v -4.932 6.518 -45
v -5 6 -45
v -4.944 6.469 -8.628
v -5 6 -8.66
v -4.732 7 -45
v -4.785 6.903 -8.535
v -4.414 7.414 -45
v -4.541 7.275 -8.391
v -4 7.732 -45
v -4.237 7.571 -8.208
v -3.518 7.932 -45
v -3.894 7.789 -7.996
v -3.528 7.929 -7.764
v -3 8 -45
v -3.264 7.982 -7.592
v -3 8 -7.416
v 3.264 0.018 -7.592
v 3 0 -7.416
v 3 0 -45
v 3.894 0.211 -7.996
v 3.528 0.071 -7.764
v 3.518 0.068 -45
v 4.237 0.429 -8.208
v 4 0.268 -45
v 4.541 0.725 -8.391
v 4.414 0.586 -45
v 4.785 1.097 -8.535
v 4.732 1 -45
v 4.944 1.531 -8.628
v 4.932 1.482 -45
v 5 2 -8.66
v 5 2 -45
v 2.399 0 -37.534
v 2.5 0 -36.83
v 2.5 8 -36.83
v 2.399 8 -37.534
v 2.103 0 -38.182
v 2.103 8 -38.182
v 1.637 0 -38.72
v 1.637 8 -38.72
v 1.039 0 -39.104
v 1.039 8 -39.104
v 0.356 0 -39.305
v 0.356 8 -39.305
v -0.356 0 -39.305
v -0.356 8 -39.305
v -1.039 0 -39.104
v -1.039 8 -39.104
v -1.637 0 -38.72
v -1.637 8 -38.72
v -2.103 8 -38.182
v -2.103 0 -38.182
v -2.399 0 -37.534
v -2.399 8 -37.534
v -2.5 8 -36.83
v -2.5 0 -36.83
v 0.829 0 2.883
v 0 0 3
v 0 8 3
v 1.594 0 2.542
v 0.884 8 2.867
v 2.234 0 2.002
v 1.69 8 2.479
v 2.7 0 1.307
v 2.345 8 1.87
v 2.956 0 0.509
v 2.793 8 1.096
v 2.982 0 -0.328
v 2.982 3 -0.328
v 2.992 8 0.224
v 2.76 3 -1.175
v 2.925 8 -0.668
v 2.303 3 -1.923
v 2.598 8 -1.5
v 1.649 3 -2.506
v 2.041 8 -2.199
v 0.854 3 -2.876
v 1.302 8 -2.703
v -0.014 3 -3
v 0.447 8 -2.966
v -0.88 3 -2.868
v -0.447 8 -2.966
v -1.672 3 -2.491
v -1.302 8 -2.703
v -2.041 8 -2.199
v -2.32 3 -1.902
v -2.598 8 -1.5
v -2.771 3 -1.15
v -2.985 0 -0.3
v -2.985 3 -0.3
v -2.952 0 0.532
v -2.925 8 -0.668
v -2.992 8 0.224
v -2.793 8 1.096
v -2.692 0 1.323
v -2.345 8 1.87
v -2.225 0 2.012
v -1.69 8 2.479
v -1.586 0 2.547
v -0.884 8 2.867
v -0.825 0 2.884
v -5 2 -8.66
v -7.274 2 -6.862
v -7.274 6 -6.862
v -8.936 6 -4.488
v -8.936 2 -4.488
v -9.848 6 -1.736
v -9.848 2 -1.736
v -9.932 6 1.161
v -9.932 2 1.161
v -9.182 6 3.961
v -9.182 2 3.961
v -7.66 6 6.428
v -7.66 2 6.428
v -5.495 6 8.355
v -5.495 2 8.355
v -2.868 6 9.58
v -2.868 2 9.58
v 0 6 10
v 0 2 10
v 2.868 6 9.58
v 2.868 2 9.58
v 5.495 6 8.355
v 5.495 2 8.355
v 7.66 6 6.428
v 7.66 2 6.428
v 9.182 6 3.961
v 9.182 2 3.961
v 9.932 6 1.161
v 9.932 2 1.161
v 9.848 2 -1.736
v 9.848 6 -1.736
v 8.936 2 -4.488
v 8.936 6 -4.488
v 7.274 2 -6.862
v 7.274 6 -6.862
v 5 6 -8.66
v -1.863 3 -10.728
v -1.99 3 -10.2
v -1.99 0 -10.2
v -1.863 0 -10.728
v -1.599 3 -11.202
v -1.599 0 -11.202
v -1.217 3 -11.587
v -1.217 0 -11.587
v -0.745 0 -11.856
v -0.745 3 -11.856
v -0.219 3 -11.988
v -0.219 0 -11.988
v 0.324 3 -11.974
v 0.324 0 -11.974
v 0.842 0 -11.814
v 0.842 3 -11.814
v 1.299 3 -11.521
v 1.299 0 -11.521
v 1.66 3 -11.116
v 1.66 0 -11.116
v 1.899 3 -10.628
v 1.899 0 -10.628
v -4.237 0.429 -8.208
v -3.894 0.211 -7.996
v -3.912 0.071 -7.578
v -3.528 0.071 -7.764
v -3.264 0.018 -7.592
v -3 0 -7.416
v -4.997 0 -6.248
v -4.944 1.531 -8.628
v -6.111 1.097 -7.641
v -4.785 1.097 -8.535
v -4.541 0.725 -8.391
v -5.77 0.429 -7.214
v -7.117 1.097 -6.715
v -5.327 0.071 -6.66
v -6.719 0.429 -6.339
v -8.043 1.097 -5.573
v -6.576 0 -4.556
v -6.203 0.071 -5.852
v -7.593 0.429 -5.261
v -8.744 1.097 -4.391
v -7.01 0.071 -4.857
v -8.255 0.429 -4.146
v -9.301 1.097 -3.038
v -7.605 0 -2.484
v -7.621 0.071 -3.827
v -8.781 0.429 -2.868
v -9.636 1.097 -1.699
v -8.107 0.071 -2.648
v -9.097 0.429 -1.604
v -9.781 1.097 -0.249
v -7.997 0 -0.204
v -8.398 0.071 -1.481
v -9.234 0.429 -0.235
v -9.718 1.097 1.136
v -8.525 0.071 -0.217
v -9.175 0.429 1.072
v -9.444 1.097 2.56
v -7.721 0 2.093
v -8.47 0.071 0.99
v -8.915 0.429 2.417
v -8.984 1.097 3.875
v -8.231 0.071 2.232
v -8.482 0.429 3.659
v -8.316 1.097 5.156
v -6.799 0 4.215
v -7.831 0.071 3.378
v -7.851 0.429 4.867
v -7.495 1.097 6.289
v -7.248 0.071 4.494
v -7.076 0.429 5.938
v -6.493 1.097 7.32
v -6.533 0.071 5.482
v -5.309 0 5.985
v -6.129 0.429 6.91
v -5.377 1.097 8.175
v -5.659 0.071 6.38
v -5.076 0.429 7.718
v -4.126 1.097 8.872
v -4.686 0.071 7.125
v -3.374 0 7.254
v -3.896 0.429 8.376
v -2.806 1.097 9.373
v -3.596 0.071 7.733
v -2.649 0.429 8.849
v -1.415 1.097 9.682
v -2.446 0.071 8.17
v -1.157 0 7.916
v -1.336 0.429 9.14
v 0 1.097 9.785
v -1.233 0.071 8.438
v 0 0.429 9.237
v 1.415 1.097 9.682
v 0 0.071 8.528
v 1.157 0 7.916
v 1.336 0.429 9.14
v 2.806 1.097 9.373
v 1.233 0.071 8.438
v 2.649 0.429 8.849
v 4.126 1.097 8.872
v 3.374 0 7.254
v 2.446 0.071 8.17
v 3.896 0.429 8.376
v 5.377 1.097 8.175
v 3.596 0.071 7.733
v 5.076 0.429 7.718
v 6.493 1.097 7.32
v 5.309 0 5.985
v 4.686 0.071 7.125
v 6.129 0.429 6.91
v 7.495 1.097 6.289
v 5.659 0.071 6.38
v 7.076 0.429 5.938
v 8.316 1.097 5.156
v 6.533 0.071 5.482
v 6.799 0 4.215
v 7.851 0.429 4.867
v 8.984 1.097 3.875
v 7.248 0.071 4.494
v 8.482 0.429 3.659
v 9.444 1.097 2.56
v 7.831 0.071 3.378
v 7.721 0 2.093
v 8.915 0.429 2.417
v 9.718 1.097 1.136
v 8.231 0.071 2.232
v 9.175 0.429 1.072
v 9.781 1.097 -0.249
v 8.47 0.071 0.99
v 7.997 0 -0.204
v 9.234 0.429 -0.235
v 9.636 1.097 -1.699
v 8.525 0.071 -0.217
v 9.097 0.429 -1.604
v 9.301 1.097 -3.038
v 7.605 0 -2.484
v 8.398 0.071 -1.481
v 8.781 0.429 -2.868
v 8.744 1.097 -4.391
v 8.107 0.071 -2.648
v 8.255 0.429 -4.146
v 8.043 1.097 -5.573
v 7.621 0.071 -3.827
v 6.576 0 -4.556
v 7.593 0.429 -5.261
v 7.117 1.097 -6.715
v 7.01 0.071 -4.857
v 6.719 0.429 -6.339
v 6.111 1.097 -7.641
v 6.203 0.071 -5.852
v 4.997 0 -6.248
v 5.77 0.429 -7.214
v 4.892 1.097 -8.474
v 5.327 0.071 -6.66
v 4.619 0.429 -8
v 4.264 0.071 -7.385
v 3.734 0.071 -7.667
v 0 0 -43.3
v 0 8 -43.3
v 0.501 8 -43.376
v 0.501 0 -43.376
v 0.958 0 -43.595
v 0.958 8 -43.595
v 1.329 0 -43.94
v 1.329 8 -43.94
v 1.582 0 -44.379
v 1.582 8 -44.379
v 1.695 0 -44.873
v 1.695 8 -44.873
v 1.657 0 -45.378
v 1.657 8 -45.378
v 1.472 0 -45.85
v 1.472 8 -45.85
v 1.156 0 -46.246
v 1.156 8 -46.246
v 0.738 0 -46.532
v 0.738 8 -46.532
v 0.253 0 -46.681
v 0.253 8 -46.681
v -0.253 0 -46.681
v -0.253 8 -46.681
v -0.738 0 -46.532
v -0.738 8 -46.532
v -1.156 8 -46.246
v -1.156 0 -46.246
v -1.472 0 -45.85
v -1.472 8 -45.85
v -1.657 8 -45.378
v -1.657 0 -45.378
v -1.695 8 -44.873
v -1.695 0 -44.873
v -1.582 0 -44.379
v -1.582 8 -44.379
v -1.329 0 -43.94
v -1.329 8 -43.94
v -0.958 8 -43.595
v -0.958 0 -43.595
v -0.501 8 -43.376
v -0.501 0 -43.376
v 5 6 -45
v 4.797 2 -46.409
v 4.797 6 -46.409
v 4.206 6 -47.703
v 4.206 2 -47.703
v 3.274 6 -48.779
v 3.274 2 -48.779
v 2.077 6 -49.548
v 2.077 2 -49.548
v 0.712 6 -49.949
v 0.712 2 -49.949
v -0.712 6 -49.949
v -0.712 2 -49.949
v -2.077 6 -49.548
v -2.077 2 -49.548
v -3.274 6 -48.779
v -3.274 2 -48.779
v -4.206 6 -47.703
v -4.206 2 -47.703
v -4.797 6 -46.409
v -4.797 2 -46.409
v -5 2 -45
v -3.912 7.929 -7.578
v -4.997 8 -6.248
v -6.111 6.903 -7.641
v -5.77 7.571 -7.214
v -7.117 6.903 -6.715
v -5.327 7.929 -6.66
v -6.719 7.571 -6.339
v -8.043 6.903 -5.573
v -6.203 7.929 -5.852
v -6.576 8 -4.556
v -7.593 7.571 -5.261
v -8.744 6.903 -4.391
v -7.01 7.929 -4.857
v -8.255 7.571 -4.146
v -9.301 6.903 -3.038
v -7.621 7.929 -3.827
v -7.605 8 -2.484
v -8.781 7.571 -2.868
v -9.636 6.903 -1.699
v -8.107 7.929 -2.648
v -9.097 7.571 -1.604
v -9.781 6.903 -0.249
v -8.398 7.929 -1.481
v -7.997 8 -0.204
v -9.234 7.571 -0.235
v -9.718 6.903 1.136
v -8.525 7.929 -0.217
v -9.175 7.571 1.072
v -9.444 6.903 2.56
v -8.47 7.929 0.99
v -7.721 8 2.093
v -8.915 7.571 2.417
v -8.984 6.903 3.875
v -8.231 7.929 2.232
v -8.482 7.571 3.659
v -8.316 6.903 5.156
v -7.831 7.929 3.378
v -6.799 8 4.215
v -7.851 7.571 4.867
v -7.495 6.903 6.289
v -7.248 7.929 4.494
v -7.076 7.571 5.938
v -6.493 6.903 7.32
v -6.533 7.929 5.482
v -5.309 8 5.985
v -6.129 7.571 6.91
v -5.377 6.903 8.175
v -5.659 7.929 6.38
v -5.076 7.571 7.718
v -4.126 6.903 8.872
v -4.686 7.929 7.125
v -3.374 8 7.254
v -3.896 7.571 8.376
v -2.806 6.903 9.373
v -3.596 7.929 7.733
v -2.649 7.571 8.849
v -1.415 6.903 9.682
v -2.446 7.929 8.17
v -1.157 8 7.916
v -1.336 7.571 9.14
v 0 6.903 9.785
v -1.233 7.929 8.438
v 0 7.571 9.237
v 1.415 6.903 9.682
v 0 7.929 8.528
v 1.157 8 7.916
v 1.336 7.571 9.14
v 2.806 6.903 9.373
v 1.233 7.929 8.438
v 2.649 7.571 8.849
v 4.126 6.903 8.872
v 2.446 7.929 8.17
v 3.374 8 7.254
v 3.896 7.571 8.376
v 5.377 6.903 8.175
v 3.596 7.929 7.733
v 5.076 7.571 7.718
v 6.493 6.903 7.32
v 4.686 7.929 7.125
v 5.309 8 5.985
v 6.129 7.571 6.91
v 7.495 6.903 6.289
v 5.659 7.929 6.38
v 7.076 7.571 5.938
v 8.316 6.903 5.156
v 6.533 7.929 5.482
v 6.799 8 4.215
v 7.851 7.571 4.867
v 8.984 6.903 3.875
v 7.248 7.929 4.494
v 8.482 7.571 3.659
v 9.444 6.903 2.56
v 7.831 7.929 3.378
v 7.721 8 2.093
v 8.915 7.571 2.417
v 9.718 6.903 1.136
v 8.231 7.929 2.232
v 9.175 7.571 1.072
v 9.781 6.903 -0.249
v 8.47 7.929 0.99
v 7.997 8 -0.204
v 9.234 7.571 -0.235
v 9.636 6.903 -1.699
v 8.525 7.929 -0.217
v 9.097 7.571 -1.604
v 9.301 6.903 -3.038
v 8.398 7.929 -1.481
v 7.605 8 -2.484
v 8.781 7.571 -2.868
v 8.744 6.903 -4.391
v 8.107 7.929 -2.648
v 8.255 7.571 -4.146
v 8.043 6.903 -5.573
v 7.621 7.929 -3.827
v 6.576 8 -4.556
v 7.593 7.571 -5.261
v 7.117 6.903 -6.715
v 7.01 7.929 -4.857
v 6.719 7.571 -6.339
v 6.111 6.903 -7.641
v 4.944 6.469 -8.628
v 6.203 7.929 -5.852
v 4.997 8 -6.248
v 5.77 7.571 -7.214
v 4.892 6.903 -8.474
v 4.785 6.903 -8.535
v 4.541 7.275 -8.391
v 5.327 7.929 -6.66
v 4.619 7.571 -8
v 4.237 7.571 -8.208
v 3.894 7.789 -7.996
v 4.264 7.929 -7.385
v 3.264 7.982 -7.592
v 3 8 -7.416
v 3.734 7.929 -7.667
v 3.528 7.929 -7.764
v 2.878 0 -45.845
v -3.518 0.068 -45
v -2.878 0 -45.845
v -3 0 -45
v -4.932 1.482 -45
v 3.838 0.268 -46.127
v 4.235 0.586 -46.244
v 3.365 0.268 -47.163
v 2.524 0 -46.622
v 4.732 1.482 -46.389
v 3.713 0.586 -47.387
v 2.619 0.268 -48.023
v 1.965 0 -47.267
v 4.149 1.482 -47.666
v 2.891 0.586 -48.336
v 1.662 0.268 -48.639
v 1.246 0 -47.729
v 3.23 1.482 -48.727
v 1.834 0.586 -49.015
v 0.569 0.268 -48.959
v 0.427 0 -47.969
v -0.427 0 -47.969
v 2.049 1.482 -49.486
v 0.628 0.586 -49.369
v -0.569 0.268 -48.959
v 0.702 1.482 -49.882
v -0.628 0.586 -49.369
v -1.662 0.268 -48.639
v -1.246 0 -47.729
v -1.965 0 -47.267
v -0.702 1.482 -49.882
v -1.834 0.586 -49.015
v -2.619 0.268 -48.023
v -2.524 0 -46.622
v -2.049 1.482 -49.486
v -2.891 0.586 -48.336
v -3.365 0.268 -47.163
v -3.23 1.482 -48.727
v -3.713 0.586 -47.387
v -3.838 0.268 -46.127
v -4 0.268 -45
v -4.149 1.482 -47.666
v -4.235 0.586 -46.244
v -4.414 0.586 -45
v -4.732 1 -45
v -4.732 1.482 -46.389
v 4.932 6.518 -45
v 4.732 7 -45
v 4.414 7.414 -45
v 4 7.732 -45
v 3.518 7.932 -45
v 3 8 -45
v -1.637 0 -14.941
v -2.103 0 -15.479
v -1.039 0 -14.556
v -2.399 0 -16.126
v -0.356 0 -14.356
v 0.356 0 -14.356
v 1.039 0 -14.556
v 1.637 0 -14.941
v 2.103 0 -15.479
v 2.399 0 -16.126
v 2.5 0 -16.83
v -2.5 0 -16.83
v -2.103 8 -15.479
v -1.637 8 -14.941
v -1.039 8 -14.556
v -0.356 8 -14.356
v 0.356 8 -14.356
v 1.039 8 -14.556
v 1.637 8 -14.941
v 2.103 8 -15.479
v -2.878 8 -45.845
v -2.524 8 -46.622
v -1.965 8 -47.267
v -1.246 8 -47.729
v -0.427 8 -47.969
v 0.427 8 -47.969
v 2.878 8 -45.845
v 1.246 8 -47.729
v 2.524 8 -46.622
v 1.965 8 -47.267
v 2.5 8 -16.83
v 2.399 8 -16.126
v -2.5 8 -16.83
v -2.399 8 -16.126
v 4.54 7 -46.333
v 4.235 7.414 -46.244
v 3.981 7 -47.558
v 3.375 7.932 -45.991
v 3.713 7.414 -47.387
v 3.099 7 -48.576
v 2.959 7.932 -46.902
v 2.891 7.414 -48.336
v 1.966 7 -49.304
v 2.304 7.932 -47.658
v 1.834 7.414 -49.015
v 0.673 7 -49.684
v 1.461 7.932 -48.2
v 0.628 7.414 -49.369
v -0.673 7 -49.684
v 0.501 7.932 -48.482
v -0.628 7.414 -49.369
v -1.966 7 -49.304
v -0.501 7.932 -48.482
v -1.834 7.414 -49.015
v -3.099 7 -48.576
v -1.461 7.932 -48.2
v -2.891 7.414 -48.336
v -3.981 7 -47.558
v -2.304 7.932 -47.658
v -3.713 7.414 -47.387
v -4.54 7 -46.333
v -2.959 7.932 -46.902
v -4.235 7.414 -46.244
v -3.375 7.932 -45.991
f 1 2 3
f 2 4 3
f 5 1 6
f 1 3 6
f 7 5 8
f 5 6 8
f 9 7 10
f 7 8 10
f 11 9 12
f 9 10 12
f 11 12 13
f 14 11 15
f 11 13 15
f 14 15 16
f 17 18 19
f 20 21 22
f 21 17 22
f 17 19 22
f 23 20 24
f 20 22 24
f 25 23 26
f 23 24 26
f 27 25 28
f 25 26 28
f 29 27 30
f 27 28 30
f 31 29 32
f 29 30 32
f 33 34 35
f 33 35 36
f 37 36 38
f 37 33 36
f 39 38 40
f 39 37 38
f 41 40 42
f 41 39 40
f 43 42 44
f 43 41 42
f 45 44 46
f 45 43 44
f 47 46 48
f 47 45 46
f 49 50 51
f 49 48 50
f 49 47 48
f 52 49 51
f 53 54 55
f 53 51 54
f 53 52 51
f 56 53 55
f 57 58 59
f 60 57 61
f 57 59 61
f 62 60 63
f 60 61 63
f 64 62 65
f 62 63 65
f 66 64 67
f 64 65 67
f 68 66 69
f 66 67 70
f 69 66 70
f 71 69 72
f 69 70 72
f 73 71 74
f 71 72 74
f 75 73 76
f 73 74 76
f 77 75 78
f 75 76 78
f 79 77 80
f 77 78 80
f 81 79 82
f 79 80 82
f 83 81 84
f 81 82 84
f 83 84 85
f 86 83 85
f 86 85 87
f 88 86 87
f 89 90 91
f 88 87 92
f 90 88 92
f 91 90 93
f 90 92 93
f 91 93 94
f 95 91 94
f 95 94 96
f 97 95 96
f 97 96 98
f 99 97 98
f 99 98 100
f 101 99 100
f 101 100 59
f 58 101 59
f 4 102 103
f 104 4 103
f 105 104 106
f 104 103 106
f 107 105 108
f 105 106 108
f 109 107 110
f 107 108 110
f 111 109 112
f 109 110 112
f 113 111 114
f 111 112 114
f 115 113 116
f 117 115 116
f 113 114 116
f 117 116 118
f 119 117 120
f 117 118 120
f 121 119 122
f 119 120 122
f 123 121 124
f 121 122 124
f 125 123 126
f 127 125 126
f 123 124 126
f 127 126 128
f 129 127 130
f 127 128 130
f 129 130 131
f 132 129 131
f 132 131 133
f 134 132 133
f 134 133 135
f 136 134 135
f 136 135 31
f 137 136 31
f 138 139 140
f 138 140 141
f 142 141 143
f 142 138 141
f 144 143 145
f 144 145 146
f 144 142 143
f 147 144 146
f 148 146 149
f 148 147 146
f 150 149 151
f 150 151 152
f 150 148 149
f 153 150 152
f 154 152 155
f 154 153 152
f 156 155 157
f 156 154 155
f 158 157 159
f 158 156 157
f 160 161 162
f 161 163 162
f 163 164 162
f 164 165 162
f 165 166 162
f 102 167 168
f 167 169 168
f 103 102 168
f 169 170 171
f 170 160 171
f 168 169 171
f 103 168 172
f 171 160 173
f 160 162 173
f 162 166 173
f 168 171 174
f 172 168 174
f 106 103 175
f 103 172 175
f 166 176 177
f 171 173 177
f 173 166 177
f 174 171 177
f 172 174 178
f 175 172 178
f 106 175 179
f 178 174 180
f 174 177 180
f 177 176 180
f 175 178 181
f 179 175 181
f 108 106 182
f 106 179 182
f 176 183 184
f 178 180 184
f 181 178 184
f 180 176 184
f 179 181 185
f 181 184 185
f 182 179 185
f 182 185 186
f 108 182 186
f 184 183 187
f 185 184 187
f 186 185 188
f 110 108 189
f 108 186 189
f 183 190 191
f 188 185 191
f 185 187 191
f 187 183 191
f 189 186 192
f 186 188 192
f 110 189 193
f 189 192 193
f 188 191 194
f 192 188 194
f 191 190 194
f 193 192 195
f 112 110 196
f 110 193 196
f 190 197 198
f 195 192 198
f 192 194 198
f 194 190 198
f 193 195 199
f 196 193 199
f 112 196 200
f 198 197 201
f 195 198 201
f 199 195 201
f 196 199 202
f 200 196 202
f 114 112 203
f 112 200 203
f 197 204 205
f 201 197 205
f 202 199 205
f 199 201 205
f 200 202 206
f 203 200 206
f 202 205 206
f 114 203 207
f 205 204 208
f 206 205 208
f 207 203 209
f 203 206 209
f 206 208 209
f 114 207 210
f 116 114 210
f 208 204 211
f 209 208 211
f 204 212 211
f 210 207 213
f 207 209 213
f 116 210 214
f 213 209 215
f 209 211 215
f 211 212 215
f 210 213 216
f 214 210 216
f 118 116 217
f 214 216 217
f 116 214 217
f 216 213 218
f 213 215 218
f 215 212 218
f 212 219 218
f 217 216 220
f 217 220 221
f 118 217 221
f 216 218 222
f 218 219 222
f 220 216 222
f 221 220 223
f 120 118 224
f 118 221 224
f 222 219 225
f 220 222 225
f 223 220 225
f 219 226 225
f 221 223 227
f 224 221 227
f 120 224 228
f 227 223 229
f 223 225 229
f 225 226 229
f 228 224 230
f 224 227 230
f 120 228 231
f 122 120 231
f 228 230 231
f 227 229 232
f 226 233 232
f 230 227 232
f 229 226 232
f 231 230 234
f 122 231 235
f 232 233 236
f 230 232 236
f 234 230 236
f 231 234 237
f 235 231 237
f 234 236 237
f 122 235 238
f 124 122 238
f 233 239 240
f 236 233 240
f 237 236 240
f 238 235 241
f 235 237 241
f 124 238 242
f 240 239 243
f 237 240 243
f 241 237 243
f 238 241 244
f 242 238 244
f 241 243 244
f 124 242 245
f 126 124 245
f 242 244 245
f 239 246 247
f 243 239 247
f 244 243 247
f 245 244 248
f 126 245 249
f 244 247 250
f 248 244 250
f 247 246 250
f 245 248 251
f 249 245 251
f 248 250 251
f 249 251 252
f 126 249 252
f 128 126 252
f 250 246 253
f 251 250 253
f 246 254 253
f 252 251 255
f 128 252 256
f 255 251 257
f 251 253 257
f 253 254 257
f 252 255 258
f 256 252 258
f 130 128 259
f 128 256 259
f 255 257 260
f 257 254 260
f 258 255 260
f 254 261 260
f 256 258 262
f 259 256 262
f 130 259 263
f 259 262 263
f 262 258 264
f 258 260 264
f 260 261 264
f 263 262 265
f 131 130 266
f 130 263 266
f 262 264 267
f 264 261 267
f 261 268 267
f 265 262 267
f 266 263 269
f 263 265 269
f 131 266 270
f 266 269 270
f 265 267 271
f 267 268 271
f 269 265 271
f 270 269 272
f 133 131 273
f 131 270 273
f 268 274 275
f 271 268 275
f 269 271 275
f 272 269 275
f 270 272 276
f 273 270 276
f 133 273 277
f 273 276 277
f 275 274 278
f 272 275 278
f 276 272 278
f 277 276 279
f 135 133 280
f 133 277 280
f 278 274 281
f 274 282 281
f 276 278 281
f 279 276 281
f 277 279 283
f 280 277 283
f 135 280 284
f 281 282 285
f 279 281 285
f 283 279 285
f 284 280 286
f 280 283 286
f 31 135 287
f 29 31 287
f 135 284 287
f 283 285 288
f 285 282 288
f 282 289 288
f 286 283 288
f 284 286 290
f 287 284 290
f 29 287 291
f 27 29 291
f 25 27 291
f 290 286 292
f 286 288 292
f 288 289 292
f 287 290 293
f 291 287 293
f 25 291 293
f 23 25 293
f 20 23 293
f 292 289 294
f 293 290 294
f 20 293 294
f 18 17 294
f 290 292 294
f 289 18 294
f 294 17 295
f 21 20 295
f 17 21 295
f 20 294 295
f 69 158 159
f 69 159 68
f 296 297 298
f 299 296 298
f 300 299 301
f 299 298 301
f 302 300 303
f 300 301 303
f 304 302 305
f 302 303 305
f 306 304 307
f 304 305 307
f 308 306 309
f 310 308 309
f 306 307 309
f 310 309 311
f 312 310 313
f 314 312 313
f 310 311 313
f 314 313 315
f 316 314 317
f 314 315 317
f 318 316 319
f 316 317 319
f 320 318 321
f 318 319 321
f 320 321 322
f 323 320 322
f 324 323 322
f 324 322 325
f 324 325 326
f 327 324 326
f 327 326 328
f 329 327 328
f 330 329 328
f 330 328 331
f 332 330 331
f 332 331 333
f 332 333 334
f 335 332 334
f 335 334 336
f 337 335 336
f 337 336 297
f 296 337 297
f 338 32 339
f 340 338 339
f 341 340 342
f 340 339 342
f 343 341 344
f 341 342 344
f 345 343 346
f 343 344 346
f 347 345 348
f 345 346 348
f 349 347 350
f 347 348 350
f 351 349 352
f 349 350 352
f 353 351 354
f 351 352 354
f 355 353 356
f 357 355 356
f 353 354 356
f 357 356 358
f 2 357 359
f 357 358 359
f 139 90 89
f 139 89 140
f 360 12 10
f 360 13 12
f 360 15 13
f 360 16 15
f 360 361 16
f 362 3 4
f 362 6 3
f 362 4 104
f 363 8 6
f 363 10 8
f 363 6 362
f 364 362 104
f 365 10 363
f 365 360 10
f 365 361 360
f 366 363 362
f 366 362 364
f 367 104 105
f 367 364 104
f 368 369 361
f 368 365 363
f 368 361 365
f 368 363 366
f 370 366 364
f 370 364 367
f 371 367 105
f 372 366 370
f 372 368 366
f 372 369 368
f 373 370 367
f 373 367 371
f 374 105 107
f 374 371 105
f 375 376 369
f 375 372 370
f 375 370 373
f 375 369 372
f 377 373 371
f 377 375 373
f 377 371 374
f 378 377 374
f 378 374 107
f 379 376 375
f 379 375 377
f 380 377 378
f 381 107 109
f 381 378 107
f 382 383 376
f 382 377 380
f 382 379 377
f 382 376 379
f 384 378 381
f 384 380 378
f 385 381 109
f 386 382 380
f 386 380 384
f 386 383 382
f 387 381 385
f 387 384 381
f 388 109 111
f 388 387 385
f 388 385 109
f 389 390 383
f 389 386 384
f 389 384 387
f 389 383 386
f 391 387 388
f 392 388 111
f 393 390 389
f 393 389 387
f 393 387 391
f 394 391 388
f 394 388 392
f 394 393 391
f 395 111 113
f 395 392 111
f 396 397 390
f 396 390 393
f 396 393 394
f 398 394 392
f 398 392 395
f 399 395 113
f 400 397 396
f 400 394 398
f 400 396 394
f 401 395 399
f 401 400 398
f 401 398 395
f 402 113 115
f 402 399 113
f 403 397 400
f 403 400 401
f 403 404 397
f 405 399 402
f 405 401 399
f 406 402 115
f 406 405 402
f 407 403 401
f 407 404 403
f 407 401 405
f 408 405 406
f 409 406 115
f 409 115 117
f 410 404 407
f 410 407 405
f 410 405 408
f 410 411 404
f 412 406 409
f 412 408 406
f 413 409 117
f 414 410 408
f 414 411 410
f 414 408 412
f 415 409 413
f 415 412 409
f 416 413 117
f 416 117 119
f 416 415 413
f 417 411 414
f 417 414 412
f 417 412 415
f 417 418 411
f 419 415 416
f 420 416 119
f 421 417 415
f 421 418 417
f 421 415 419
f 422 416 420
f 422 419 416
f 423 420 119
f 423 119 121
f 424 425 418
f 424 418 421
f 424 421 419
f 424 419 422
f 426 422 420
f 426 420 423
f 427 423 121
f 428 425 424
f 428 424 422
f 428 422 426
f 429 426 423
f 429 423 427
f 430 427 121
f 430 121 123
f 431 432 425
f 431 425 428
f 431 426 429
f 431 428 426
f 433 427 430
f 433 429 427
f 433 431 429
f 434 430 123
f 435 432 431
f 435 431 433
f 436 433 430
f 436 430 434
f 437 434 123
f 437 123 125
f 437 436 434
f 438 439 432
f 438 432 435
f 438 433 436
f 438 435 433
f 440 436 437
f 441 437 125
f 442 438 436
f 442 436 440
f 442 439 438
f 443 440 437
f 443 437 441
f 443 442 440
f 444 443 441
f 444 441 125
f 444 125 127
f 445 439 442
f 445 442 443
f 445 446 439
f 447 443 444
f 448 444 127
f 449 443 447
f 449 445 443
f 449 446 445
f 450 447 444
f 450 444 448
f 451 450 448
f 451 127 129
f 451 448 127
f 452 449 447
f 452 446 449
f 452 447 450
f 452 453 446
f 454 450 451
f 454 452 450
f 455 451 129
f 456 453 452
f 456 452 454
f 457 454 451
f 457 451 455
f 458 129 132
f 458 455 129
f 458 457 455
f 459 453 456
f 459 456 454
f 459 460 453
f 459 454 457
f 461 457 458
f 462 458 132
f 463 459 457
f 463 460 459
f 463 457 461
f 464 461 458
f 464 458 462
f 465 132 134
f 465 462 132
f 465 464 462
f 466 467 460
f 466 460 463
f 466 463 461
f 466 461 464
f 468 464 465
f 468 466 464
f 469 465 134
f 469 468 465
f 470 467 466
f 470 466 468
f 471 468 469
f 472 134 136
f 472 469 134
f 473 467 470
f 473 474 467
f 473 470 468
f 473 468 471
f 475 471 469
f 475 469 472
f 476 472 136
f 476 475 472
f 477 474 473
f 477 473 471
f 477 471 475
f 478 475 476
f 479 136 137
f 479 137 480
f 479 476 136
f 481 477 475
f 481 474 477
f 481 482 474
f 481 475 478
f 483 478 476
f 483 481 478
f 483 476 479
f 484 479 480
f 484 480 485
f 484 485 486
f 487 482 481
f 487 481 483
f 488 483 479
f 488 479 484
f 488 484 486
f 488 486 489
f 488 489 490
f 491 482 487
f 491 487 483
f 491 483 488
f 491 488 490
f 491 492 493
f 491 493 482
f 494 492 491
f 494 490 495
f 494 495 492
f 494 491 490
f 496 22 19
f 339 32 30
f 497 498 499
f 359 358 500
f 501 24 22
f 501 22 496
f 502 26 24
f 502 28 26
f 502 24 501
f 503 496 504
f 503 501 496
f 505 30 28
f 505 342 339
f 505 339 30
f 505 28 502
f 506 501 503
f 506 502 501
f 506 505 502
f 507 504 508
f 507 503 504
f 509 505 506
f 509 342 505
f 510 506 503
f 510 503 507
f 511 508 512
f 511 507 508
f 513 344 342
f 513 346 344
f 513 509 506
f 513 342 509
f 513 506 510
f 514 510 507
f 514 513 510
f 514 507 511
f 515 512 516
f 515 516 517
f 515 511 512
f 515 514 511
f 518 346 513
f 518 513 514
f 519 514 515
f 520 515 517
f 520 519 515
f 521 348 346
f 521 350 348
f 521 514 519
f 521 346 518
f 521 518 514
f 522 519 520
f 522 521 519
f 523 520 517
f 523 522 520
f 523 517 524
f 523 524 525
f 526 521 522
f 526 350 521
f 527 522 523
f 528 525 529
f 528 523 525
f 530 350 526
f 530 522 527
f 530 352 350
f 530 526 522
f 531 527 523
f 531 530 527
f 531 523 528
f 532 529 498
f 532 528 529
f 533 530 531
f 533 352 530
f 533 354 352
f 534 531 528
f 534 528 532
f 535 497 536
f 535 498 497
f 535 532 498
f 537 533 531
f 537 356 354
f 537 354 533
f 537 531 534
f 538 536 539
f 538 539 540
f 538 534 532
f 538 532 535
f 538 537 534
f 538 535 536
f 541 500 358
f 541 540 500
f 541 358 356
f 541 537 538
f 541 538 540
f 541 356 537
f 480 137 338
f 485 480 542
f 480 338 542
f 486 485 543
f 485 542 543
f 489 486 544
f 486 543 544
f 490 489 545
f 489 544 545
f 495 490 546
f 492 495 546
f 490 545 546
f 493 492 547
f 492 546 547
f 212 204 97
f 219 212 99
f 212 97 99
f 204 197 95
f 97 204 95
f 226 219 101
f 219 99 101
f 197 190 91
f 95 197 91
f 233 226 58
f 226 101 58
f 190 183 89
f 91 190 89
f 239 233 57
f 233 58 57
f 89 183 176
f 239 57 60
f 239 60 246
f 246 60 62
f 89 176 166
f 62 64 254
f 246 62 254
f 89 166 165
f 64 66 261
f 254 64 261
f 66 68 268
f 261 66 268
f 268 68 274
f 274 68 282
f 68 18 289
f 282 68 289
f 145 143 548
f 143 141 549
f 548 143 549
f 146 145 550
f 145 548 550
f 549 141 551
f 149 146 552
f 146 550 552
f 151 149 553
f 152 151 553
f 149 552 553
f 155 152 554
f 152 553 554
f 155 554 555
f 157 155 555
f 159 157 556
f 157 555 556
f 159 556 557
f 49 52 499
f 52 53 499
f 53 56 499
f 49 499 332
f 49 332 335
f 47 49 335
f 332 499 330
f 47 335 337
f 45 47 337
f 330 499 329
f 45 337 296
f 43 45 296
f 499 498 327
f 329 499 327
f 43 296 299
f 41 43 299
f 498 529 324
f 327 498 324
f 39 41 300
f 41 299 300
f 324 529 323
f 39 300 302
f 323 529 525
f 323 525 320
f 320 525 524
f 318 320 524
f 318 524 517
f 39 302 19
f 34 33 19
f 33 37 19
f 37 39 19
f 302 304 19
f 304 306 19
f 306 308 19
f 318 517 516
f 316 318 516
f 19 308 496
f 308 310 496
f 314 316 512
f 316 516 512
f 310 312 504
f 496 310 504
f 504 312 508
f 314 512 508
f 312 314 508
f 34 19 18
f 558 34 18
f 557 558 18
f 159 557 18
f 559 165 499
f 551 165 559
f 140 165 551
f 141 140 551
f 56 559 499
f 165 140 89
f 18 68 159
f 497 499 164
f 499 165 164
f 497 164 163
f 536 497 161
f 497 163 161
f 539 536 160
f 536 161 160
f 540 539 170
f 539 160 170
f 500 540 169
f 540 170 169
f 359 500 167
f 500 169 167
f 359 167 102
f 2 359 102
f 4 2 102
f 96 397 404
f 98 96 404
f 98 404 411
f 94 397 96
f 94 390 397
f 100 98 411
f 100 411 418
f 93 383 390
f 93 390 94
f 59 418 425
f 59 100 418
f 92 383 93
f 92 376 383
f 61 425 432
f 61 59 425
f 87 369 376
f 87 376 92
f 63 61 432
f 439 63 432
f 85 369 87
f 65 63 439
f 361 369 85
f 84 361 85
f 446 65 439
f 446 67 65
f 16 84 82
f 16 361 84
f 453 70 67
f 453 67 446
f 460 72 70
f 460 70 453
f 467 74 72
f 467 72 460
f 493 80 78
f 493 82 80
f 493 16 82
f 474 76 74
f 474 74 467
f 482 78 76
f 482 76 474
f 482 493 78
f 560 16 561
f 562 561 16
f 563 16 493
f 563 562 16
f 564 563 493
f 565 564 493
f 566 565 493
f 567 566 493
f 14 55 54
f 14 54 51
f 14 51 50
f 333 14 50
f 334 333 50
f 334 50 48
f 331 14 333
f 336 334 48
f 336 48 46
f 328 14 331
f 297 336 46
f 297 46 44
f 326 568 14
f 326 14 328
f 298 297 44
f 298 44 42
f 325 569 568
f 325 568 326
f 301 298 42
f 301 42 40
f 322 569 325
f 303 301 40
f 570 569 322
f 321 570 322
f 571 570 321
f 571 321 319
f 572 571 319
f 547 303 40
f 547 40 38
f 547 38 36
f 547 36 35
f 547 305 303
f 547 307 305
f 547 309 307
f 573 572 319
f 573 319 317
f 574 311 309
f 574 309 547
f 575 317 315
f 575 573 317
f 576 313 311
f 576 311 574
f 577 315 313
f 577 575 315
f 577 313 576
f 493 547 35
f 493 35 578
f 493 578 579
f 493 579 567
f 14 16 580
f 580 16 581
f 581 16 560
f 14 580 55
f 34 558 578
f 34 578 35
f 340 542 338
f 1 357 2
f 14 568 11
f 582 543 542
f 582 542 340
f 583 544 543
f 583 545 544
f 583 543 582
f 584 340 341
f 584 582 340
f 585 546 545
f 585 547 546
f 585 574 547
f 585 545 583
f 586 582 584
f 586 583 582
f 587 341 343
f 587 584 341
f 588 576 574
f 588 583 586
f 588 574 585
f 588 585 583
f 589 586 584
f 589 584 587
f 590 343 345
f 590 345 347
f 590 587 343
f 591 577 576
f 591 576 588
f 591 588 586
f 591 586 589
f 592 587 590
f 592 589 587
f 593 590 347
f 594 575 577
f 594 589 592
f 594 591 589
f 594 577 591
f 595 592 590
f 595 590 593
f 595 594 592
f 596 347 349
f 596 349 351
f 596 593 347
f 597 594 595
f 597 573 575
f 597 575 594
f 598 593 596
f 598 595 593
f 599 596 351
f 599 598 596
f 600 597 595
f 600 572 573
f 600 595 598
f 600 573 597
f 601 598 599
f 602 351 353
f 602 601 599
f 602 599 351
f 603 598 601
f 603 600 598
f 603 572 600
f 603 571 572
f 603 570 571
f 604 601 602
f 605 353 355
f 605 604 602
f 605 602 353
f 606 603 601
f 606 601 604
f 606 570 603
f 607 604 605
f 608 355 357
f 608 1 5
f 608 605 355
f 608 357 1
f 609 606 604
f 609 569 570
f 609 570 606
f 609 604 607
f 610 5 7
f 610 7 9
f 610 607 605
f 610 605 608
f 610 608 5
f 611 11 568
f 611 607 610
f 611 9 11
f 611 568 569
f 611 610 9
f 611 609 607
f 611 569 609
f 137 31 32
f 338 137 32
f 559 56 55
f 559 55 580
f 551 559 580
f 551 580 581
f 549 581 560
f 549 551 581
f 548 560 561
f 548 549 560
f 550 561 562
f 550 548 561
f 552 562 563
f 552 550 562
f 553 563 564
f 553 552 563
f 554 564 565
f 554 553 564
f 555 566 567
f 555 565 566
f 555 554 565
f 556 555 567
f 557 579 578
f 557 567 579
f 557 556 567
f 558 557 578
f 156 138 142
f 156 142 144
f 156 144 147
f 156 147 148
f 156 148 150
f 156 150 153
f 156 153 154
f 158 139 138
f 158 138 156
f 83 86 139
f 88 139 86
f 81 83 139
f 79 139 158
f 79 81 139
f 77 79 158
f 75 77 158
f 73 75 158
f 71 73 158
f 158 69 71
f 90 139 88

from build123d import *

# Parameters (mm, degrees)
EXTRUDE_1_DEPTH     = 8
CUT_EXTRUDE_1_REACH = 53.614
CUT_EXTRUDE_START   = -3
CUT_EXTRUDE_2_DEPTH = 3
CUT_EXTRUDE_3_REACH = 53.614
CUT_EXTRUDE_4_REACH = 53.614
FILLET_2_R          = 2


with BuildPart() as part:
    # 草图1 → 凸台-拉伸1 (new body)
    with BuildSketch(Plane(origin=(0, 0, 0), x_dir=(1, 0, 0), z_dir=(0, 1, 0))):
        with BuildLine():
            Line((-5, 45), (-5, 8.660254038))
            ThreePointArc((-5, 8.660254038), (0, -10), (5, 8.660254038))
            Line((5, 8.660254038), (5, 45))
            ThreePointArc((5, 45), (0, 50), (-5, 45))
        make_face()
    extrude(amount=EXTRUDE_1_DEPTH)

    # 草图2 → 切除-拉伸1 (cut, up to next)
    with BuildSketch(Plane(origin=(0, 8, 0), x_dir=(1, 0, 0), z_dir=(0, 1, 0)), mode=Mode.PRIVATE) as cut_extrude_1_sk1:
        with BuildLine():
            ThreePointArc((3, 0), (2.121320344, 2.121320344), (0, 3))
            ThreePointArc((0, 3), (-2.121320344, -2.121320344), (3, 0))
        make_face()
    cut_extrude_1_tool1 = extrude(cut_extrude_1_sk1.sketch, amount=-CUT_EXTRUDE_1_REACH, mode=Mode.PRIVATE) & part.part
    add(cut_extrude_1_tool1.solids().sort_by_distance((0, 8, 0))[0], mode=Mode.SUBTRACT)

    # 草图3 → 切除-拉伸2 (cut)
    with BuildSketch(Plane.XZ.offset(CUT_EXTRUDE_START)):
        with BuildLine():
            Line((-2.984962311, -0.3), (-1.989974874, -10.2))
            ThreePointArc((-1.989974874, -10.2), (-0.218979353, -11.987975866), (1.898730713, -10.628348376))
            Line((1.898730713, -10.628348376), (2.984962311, -0.3))
            ThreePointArc((2.984962311, -0.3), (0, 3), (-2.984962311, -0.3))
        make_face()
    extrude(amount=CUT_EXTRUDE_2_DEPTH, mode=Mode.SUBTRACT)

    # 草图4 → 切除-拉伸3 (cut, up to next)
    with BuildSketch(Plane(origin=(0, 8, 0), x_dir=(1, 0, 0), z_dir=(0, 1, 0)), mode=Mode.PRIVATE) as cut_extrude_3_sk1:
        with BuildLine():
            ThreePointArc((1.7, 45), (-1.202081528, 46.202081528), (0, 43.3))
            ThreePointArc((0, 43.3), (1.202081528, 43.797918472), (1.7, 45))
        make_face()
    cut_extrude_3_tool1 = extrude(cut_extrude_3_sk1.sketch, amount=-CUT_EXTRUDE_3_REACH, mode=Mode.PRIVATE) & part.part
    add(cut_extrude_3_tool1.solids().sort_by_distance((0, 8, -45))[0], mode=Mode.SUBTRACT)

    # 草图5 → 切除-拉伸4 (cut, up to next)
    with BuildSketch(Plane.XZ, mode=Mode.PRIVATE) as cut_extrude_4_sk1:
        with BuildLine():
            Line((-2.5, -16.830127019), (-2.5, -26.830127019))
            Line((-2.5, -26.830127019), (-2.5, -36.830127019))
            ThreePointArc((-2.5, -36.830127019), (0, -39.330127019), (2.5, -36.830127019))
            Line((2.5, -36.830127019), (2.5, -16.830127019))
            ThreePointArc((2.5, -16.830127019), (0, -14.330127019), (-2.5, -16.830127019))
        make_face()
    cut_extrude_4_tool1 = extrude(cut_extrude_4_sk1.sketch, amount=-CUT_EXTRUDE_4_REACH, mode=Mode.PRIVATE) & part.part
    add(cut_extrude_4_tool1.solids().sort_by_distance((0, 0, -26.830127))[0], mode=Mode.SUBTRACT)

    # 圆角2
    fillet_2_edges = [part.edges().sort_by_distance(p)[0] for p in [
        (0, 0, 10),
        (-5, 0, -26.830127019),
        (0, 0, -50),
        (5, 0, -26.830127019),
        (0, 8, 10),
        (5, 8, -26.830127019),
        (0, 8, -50),
        (-5, 8, -26.830127019),
    ]]
    fillet(fillet_2_edges, radius=FILLET_2_R)


solid = part.part
